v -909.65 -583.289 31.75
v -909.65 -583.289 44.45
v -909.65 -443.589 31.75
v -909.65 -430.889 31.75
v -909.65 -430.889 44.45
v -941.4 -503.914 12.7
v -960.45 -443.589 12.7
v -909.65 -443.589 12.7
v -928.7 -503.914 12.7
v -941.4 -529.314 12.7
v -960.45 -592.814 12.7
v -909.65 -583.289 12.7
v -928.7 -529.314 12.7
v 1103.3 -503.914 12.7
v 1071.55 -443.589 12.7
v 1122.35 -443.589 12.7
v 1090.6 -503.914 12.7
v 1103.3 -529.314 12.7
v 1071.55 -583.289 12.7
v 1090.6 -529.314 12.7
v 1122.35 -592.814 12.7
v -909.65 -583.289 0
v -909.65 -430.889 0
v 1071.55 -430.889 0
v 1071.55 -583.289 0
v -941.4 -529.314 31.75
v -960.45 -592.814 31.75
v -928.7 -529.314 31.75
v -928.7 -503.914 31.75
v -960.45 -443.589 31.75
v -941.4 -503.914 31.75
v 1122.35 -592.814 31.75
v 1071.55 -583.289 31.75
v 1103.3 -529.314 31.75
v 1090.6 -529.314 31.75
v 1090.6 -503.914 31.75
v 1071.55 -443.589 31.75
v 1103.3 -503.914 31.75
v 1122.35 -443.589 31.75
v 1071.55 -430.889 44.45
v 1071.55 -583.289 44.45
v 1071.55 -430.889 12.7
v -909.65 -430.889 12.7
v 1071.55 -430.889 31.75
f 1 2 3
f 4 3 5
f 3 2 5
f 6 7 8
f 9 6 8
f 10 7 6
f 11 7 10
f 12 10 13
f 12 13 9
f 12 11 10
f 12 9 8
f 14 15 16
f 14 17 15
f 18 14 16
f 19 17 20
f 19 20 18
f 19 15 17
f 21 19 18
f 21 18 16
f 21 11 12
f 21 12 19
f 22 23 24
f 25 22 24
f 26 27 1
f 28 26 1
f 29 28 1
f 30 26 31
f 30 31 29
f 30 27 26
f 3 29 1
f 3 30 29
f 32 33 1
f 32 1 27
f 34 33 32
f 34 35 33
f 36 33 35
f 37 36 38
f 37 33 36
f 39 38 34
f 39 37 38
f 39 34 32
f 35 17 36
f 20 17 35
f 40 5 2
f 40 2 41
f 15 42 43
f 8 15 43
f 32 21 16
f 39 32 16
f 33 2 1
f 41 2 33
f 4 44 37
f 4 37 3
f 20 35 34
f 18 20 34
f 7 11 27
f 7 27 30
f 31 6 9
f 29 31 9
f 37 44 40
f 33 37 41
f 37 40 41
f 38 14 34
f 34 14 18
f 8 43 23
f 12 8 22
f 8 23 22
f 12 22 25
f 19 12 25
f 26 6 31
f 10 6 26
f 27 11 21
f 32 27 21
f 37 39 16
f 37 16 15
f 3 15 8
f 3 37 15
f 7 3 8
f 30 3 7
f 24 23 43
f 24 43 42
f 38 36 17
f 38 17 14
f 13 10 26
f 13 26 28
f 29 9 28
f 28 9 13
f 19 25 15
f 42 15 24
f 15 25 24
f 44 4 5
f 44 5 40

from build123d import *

# Parameters (mm, degrees)
F0_W     = 2082.8
F0_H     = 161.925
F1_DEPTH = 44.45
F2_W     = 1981.2
F2_H     = 9.525
F3_DEPTH = 12.7
F4_W     = 1981.2
F4_H     = 9.525
F5_DEPTH = 12.7
F6_W     = 2082.8
F6_H     = 19.05
F7_DEPTH = 12.7
F8_W     = 12.7
F8_H     = 25.4
F9_DEPTH = 31.751


with BuildPart() as f1:
    # F0 (on Top) → F1 (new body)
    with BuildSketch(Plane.XY):
        with Locations((80.949743, -511.85186)):
            Rectangle(F0_W, F0_H)
    extrude(amount=F1_DEPTH)

    # F2 (on face) → F3 (cut)
    with BuildSketch(Plane(origin=(0, 0, 0), x_dir=(1, 0, 0), z_dir=(0, 0, -1))):
        Polygon((-960.450257, 592.81436), (-960.450257, 430.88936), (-909.650257, 430.88936), (-909.650257, 583.28936), (-909.650257, 592.81436), align=None)
        with Locations((80.949743, 588.05186)):
            Rectangle(F2_W, F2_H)
        Polygon((1071.549743, 592.81436), (1071.549743, 583.28936), (1071.549743, 430.88936), (1122.349743, 430.88936), (1122.349743, 592.81436), align=None)
    extrude(amount=-F3_DEPTH, mode=Mode.SUBTRACT)

    # F4 (on face) → F5 (cut)
    with BuildSketch(Plane.XY.offset(44.45)):
        Polygon((1122.349743, -430.88936), (1071.549743, -430.88936), (1071.549743, -583.28936), (1071.549743, -592.81436), (1122.349743, -592.81436), align=None)
        with Locations((80.949743, -588.05186)):
            Rectangle(F4_W, F4_H)
        Polygon((-909.650257, -592.81436), (-909.650257, -583.28936), (-909.650257, -430.88936), (-960.450257, -430.88936), (-960.450257, -592.81436), align=None)
    extrude(amount=-F5_DEPTH, mode=Mode.SUBTRACT)

    # F6 (on face) → F7 (cut)
    with BuildSketch(Plane(origin=(0, -430.88936, 0), x_dir=(-1, 0, 0), z_dir=(0, 1, 0))):
        with Locations((-80.949743, 22.225)):
            Rectangle(F6_W, F6_H)
    extrude(amount=-F7_DEPTH, mode=Mode.SUBTRACT)

    # F8 (on face) → F9 (cut, through all)
    with BuildSketch(Plane(origin=(0, 0, 12.7), x_dir=(1, 0, 0), z_dir=(0, 0, -1))):
        with Locations((-935.050257, 516.61436)):
            Rectangle(F8_W, F8_H)
        with Locations((1096.949743, 516.61436)):
            Rectangle(F8_W, F8_H)
    extrude(amount=-F9_DEPTH, mode=Mode.SUBTRACT)


solid = f1.part
